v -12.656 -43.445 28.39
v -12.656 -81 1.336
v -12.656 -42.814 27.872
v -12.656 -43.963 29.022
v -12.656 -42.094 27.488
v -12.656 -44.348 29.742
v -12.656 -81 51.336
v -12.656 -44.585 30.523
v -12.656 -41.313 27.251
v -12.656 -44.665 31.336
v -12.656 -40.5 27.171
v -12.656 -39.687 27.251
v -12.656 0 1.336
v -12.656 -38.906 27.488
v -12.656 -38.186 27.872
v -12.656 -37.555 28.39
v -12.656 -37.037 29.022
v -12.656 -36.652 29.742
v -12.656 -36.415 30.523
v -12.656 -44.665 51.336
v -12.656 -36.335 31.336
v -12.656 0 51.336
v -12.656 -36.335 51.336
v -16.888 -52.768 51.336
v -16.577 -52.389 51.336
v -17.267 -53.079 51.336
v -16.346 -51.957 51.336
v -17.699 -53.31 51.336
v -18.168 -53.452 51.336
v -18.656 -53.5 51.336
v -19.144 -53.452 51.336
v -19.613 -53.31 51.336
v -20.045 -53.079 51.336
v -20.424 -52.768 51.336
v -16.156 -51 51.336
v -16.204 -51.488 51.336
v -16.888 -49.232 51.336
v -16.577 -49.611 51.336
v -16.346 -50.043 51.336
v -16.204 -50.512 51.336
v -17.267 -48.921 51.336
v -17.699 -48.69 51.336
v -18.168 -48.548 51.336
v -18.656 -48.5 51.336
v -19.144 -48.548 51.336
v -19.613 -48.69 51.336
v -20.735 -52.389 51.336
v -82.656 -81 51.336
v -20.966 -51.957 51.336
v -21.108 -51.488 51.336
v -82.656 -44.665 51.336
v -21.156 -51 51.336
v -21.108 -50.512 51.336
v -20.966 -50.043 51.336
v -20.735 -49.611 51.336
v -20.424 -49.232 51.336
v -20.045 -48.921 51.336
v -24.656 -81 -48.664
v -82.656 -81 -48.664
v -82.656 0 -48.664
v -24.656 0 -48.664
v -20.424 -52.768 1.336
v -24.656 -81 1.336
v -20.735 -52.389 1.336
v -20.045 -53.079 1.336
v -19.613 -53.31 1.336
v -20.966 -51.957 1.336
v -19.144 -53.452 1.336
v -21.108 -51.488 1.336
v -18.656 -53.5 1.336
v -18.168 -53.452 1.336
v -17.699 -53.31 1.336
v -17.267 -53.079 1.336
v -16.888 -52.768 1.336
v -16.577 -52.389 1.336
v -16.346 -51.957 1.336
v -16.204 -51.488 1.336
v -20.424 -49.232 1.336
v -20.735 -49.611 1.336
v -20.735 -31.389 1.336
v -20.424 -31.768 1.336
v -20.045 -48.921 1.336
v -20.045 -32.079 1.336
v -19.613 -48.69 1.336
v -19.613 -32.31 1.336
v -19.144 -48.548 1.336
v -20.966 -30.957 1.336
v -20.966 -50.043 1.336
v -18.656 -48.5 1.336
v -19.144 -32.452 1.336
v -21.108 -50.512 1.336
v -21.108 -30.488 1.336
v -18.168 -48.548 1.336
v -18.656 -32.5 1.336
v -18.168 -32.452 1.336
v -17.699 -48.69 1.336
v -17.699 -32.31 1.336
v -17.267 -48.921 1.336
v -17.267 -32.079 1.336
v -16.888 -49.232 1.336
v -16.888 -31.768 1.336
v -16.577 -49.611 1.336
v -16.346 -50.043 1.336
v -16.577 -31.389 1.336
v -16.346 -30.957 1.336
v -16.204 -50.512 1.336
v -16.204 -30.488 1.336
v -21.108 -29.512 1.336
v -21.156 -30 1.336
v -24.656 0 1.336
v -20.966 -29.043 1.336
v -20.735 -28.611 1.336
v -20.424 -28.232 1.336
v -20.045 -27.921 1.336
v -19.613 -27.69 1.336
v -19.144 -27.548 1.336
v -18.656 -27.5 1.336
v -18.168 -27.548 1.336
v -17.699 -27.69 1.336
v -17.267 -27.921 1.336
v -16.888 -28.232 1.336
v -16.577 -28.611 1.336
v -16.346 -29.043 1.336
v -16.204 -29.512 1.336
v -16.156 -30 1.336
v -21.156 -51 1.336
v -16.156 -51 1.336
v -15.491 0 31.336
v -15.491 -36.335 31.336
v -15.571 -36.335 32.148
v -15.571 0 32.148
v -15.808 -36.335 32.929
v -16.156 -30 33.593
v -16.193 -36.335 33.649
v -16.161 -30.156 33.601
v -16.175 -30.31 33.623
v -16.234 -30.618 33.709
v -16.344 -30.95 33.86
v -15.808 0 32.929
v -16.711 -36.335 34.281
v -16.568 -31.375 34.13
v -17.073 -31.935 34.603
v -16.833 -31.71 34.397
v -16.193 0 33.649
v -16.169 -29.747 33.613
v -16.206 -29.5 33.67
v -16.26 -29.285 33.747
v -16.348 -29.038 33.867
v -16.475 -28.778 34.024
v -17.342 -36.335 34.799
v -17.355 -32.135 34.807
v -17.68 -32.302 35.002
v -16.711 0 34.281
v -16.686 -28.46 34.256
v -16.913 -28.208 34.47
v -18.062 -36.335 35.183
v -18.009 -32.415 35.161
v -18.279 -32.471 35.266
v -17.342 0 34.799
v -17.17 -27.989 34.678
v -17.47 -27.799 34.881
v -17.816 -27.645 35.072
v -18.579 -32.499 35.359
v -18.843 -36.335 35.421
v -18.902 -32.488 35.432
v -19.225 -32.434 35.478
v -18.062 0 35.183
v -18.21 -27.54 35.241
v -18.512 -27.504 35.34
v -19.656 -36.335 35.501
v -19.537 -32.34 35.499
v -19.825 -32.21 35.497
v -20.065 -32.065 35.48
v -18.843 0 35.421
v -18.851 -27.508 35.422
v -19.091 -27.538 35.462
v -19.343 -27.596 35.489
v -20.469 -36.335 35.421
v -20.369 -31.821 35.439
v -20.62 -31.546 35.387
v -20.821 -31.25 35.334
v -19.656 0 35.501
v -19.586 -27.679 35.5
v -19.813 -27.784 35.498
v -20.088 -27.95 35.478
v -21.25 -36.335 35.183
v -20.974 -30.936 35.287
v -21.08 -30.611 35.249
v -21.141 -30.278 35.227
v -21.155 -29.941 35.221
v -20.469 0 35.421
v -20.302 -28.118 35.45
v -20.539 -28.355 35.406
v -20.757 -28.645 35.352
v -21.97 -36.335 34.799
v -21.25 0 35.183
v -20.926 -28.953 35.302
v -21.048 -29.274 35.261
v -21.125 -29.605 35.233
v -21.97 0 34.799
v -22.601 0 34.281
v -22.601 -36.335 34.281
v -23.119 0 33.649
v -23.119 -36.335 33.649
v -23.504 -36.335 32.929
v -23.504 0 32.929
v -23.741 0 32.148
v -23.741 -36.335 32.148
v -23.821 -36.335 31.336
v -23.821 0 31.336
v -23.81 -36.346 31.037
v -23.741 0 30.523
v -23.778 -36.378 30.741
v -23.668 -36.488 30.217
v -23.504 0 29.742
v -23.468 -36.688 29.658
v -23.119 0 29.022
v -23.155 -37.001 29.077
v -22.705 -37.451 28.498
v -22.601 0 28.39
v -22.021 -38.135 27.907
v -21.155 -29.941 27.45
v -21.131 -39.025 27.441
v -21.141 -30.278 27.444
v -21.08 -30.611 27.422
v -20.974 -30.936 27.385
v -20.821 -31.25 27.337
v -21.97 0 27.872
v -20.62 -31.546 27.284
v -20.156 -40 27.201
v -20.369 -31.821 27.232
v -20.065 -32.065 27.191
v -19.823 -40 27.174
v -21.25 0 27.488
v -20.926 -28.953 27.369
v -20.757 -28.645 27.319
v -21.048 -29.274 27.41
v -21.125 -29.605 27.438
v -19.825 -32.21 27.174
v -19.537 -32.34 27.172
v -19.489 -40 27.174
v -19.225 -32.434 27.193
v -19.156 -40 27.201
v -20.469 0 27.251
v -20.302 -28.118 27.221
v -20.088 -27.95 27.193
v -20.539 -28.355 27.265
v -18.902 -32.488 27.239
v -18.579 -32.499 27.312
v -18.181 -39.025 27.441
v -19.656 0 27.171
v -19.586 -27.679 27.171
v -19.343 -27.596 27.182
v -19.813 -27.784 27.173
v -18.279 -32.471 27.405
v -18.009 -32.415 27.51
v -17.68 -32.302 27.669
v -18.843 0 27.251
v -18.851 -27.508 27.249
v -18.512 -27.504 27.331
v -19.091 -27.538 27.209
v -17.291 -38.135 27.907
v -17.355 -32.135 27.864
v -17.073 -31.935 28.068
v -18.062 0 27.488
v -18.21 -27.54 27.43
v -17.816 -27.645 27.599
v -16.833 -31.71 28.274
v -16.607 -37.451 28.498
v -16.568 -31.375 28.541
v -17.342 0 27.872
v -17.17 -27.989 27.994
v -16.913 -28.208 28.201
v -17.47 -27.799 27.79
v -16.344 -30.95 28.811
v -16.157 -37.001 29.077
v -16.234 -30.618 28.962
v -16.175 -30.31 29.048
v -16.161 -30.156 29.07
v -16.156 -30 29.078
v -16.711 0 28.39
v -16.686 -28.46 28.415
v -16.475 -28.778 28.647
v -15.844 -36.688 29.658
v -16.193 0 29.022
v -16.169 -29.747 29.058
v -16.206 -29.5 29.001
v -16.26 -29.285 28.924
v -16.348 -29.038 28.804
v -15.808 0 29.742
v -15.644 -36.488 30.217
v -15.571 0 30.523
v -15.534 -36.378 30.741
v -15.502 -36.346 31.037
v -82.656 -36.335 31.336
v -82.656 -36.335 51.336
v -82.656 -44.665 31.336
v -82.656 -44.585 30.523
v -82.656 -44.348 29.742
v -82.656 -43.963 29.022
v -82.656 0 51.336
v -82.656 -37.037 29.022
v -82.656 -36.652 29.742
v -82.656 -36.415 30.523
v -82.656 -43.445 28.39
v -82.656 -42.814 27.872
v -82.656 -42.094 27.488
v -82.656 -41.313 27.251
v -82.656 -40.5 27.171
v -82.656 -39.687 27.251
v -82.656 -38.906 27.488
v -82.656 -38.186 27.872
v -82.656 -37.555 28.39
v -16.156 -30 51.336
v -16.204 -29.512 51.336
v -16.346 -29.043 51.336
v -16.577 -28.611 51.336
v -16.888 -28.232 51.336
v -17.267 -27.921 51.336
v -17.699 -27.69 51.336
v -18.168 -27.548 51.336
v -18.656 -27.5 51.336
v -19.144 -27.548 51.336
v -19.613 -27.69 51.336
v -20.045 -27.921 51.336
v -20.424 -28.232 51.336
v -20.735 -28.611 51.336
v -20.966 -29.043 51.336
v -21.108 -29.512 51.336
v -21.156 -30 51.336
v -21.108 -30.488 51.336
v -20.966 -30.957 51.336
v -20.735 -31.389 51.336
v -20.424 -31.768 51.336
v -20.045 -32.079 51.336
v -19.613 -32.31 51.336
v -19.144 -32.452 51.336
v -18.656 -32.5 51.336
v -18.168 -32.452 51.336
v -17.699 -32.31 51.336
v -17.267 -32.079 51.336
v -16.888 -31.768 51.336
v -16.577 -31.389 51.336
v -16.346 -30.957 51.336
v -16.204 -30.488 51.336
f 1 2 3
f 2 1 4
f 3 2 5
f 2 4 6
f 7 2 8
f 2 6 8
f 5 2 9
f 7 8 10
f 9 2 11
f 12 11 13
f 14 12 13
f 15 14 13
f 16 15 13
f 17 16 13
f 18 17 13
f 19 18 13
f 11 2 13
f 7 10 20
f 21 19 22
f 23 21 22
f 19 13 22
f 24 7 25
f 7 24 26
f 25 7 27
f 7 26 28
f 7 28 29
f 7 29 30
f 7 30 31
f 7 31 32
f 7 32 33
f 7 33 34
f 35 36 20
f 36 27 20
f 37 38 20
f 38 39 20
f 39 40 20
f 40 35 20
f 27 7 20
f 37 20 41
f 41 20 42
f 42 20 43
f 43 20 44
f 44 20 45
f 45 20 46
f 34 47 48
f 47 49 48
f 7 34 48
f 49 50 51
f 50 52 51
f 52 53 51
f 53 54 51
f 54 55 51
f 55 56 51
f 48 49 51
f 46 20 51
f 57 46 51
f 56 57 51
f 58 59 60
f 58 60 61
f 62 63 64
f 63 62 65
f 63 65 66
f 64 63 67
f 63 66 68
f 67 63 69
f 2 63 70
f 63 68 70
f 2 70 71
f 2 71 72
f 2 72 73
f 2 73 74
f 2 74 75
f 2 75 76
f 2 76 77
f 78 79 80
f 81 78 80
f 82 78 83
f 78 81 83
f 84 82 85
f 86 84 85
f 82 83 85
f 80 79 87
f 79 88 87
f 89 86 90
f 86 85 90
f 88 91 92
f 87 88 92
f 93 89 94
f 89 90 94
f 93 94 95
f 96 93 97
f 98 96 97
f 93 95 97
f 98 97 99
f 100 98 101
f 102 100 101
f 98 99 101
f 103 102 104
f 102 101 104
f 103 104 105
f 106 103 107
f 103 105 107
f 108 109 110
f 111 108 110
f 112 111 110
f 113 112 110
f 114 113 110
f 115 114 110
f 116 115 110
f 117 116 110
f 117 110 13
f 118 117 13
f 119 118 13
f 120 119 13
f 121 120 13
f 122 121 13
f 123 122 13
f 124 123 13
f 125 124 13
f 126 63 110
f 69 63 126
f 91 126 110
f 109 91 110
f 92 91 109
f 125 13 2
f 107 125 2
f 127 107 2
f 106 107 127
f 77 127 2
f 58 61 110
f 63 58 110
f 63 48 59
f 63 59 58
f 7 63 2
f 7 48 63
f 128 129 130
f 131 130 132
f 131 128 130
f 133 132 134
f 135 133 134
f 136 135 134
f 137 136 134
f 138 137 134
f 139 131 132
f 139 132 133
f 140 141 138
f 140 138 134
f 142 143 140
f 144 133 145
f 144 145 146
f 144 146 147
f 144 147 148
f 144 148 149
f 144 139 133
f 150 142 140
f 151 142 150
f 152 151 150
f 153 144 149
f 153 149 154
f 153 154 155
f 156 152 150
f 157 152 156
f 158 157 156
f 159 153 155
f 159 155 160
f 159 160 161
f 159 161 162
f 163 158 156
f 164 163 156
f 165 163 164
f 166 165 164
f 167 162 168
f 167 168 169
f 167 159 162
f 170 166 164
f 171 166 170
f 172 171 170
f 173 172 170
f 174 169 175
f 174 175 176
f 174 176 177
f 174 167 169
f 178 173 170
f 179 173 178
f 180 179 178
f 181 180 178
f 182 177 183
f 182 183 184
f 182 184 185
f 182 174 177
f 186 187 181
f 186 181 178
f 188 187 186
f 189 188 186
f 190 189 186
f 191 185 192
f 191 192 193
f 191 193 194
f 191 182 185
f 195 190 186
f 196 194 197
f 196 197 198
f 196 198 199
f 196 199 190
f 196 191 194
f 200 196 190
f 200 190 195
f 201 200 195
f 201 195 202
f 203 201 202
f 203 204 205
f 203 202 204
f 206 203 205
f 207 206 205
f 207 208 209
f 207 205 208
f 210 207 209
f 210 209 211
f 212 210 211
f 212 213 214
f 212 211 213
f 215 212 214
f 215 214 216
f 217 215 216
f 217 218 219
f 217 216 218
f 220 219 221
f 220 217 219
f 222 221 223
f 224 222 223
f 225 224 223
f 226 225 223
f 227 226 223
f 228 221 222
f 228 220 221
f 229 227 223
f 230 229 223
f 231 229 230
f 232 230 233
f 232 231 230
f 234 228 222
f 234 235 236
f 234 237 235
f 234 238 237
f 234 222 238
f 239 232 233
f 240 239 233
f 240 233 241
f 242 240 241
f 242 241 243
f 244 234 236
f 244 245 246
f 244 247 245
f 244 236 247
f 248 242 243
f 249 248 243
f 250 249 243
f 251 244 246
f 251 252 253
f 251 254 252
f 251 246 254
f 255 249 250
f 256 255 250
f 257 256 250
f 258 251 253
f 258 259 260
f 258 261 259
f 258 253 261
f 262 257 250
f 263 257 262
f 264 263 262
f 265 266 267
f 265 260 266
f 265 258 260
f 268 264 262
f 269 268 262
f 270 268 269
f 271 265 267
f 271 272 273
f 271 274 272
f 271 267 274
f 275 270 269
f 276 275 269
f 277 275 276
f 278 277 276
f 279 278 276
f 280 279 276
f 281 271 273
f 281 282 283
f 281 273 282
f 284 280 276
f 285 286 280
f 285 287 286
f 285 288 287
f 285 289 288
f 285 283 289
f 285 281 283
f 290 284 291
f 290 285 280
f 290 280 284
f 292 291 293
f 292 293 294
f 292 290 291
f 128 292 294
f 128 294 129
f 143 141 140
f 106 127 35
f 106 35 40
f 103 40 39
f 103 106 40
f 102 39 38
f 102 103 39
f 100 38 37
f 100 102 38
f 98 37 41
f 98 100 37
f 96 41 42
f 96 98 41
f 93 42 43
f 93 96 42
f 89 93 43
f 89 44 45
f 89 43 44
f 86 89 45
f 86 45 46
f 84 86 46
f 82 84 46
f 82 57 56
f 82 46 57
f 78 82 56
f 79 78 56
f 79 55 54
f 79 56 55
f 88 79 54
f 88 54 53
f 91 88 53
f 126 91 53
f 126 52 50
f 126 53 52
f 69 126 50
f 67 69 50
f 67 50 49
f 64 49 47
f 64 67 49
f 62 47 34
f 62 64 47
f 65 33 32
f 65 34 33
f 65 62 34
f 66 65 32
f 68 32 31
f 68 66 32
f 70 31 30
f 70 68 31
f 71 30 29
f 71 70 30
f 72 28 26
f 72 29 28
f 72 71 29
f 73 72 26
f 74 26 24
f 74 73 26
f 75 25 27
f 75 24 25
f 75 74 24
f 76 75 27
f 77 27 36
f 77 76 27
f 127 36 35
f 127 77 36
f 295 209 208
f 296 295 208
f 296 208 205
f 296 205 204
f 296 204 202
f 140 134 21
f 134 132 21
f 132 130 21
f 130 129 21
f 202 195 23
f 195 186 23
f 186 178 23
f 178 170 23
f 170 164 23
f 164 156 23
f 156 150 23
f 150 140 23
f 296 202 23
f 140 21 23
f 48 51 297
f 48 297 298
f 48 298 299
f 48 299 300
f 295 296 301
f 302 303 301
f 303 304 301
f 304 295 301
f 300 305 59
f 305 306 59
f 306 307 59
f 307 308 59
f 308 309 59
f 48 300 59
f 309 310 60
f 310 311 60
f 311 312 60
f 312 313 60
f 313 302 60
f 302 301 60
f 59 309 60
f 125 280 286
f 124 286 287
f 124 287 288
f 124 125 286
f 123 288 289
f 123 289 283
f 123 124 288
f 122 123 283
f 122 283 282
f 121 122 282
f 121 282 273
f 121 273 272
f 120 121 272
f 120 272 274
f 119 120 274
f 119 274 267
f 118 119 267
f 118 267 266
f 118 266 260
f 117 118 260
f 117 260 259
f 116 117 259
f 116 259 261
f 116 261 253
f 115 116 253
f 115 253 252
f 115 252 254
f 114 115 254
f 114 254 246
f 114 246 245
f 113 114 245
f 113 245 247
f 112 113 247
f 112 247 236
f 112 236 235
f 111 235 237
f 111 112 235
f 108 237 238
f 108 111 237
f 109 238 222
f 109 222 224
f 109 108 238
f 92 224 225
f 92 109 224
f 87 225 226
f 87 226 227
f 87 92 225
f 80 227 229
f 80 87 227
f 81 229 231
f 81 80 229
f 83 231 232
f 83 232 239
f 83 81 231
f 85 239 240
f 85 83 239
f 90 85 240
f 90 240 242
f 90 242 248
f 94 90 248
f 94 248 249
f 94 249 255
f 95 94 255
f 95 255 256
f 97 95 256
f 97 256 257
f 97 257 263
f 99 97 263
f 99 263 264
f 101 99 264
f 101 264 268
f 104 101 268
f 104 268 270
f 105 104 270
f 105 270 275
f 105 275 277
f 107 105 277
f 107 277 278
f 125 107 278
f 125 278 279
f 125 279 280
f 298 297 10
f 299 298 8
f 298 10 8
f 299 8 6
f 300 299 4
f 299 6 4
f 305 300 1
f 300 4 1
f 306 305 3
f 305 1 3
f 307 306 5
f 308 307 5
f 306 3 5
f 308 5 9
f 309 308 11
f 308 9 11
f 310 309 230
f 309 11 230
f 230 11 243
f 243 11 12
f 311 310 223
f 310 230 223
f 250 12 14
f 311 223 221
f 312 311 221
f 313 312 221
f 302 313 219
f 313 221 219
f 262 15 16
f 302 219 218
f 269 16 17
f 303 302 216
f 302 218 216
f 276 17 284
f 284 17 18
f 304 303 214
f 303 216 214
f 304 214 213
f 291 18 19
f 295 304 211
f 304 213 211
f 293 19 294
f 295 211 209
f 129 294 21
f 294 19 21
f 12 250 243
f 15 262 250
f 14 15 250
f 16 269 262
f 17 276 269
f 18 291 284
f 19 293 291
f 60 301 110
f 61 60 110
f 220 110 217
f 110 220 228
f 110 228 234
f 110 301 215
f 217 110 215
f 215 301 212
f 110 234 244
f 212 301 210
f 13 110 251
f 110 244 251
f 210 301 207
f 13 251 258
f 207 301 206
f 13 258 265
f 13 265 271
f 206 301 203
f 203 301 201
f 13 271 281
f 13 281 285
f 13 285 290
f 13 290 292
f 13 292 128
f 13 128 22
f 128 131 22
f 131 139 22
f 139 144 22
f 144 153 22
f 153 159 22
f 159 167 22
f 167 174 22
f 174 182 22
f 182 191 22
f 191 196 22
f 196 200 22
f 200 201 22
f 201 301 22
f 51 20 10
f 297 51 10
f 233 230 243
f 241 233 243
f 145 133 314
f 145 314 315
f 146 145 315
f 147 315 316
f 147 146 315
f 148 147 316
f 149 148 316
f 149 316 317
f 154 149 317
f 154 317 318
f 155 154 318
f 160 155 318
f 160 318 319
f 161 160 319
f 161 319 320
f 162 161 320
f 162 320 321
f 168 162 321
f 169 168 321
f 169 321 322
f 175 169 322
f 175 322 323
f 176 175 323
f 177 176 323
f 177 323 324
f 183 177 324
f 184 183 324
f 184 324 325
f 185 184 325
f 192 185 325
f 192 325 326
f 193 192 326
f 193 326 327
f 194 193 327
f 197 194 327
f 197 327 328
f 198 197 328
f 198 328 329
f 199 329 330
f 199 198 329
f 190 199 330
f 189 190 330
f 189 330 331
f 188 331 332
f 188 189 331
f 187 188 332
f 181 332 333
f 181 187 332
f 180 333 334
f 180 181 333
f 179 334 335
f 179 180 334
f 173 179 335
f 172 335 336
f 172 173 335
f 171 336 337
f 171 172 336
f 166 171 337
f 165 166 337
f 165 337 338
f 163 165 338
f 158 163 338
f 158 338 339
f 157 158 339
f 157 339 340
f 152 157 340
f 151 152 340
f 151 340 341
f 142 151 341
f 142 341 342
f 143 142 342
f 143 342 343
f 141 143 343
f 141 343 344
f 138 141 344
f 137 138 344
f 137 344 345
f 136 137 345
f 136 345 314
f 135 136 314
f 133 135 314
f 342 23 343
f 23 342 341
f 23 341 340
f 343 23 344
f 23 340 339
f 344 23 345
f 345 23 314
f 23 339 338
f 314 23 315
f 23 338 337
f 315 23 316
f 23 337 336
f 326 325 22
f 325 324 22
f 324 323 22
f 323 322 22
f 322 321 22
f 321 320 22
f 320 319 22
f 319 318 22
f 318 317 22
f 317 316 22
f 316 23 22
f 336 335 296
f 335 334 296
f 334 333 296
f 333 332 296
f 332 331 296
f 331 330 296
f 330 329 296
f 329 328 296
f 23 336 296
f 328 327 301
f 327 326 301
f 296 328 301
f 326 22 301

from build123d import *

# Parameters (mm, degrees)
F1_DEPTH = 81
F2_R     = 2.5
F3_DEPTH = 51.336541
F5_DEPTH = 100
F6_R     = 4.165
F7_DEPTH = 40


with BuildPart() as f1:
    # F0 (on Front) → F1 (new body)
    with BuildSketch(Plane.XZ):
        Polygon((-12.655995, 51.335541), (-82.655995, 51.335541), (-82.655995, -48.664459), (-24.655995, -48.664459), (-24.655995, 1.335541), (-12.655995, 1.335541), align=None)
    extrude(amount=F1_DEPTH)

    # F2 (on Top) → F3 (cut, through all)
    with BuildSketch(Plane.XY):
        with Locations((-18.655995, -30)):
            Circle(F2_R)
        with Locations((-18.655995, -51)):
            Circle(F2_R)
    extrude(amount=F3_DEPTH, mode=Mode.SUBTRACT)

    # F4 (on Right) → F5 (cut)
    with BuildSketch(Plane.YZ):
        with BuildLine():
            Line((-36.335, 31.335541), (-36.335, 51.335541))
            ThreePointArc((-36.335, 51.335541), (-40.5, 55.500541), (-44.665, 51.335541))
            Line((-44.665, 51.335541), (-44.665, 31.335541))
            ThreePointArc((-44.665, 31.335541), (-40.5, 27.170541), (-36.335, 31.335541))
        make_face()
    extrude(amount=-F5_DEPTH, mode=Mode.SUBTRACT)

    # F6 (on Front) → F7 (cut)
    with BuildSketch(Plane.XZ):
        with Locations((-19.655995, 31.335541)):
            Circle(F6_R)
    extrude(amount=F7_DEPTH, mode=Mode.SUBTRACT)


solid = f1.part
